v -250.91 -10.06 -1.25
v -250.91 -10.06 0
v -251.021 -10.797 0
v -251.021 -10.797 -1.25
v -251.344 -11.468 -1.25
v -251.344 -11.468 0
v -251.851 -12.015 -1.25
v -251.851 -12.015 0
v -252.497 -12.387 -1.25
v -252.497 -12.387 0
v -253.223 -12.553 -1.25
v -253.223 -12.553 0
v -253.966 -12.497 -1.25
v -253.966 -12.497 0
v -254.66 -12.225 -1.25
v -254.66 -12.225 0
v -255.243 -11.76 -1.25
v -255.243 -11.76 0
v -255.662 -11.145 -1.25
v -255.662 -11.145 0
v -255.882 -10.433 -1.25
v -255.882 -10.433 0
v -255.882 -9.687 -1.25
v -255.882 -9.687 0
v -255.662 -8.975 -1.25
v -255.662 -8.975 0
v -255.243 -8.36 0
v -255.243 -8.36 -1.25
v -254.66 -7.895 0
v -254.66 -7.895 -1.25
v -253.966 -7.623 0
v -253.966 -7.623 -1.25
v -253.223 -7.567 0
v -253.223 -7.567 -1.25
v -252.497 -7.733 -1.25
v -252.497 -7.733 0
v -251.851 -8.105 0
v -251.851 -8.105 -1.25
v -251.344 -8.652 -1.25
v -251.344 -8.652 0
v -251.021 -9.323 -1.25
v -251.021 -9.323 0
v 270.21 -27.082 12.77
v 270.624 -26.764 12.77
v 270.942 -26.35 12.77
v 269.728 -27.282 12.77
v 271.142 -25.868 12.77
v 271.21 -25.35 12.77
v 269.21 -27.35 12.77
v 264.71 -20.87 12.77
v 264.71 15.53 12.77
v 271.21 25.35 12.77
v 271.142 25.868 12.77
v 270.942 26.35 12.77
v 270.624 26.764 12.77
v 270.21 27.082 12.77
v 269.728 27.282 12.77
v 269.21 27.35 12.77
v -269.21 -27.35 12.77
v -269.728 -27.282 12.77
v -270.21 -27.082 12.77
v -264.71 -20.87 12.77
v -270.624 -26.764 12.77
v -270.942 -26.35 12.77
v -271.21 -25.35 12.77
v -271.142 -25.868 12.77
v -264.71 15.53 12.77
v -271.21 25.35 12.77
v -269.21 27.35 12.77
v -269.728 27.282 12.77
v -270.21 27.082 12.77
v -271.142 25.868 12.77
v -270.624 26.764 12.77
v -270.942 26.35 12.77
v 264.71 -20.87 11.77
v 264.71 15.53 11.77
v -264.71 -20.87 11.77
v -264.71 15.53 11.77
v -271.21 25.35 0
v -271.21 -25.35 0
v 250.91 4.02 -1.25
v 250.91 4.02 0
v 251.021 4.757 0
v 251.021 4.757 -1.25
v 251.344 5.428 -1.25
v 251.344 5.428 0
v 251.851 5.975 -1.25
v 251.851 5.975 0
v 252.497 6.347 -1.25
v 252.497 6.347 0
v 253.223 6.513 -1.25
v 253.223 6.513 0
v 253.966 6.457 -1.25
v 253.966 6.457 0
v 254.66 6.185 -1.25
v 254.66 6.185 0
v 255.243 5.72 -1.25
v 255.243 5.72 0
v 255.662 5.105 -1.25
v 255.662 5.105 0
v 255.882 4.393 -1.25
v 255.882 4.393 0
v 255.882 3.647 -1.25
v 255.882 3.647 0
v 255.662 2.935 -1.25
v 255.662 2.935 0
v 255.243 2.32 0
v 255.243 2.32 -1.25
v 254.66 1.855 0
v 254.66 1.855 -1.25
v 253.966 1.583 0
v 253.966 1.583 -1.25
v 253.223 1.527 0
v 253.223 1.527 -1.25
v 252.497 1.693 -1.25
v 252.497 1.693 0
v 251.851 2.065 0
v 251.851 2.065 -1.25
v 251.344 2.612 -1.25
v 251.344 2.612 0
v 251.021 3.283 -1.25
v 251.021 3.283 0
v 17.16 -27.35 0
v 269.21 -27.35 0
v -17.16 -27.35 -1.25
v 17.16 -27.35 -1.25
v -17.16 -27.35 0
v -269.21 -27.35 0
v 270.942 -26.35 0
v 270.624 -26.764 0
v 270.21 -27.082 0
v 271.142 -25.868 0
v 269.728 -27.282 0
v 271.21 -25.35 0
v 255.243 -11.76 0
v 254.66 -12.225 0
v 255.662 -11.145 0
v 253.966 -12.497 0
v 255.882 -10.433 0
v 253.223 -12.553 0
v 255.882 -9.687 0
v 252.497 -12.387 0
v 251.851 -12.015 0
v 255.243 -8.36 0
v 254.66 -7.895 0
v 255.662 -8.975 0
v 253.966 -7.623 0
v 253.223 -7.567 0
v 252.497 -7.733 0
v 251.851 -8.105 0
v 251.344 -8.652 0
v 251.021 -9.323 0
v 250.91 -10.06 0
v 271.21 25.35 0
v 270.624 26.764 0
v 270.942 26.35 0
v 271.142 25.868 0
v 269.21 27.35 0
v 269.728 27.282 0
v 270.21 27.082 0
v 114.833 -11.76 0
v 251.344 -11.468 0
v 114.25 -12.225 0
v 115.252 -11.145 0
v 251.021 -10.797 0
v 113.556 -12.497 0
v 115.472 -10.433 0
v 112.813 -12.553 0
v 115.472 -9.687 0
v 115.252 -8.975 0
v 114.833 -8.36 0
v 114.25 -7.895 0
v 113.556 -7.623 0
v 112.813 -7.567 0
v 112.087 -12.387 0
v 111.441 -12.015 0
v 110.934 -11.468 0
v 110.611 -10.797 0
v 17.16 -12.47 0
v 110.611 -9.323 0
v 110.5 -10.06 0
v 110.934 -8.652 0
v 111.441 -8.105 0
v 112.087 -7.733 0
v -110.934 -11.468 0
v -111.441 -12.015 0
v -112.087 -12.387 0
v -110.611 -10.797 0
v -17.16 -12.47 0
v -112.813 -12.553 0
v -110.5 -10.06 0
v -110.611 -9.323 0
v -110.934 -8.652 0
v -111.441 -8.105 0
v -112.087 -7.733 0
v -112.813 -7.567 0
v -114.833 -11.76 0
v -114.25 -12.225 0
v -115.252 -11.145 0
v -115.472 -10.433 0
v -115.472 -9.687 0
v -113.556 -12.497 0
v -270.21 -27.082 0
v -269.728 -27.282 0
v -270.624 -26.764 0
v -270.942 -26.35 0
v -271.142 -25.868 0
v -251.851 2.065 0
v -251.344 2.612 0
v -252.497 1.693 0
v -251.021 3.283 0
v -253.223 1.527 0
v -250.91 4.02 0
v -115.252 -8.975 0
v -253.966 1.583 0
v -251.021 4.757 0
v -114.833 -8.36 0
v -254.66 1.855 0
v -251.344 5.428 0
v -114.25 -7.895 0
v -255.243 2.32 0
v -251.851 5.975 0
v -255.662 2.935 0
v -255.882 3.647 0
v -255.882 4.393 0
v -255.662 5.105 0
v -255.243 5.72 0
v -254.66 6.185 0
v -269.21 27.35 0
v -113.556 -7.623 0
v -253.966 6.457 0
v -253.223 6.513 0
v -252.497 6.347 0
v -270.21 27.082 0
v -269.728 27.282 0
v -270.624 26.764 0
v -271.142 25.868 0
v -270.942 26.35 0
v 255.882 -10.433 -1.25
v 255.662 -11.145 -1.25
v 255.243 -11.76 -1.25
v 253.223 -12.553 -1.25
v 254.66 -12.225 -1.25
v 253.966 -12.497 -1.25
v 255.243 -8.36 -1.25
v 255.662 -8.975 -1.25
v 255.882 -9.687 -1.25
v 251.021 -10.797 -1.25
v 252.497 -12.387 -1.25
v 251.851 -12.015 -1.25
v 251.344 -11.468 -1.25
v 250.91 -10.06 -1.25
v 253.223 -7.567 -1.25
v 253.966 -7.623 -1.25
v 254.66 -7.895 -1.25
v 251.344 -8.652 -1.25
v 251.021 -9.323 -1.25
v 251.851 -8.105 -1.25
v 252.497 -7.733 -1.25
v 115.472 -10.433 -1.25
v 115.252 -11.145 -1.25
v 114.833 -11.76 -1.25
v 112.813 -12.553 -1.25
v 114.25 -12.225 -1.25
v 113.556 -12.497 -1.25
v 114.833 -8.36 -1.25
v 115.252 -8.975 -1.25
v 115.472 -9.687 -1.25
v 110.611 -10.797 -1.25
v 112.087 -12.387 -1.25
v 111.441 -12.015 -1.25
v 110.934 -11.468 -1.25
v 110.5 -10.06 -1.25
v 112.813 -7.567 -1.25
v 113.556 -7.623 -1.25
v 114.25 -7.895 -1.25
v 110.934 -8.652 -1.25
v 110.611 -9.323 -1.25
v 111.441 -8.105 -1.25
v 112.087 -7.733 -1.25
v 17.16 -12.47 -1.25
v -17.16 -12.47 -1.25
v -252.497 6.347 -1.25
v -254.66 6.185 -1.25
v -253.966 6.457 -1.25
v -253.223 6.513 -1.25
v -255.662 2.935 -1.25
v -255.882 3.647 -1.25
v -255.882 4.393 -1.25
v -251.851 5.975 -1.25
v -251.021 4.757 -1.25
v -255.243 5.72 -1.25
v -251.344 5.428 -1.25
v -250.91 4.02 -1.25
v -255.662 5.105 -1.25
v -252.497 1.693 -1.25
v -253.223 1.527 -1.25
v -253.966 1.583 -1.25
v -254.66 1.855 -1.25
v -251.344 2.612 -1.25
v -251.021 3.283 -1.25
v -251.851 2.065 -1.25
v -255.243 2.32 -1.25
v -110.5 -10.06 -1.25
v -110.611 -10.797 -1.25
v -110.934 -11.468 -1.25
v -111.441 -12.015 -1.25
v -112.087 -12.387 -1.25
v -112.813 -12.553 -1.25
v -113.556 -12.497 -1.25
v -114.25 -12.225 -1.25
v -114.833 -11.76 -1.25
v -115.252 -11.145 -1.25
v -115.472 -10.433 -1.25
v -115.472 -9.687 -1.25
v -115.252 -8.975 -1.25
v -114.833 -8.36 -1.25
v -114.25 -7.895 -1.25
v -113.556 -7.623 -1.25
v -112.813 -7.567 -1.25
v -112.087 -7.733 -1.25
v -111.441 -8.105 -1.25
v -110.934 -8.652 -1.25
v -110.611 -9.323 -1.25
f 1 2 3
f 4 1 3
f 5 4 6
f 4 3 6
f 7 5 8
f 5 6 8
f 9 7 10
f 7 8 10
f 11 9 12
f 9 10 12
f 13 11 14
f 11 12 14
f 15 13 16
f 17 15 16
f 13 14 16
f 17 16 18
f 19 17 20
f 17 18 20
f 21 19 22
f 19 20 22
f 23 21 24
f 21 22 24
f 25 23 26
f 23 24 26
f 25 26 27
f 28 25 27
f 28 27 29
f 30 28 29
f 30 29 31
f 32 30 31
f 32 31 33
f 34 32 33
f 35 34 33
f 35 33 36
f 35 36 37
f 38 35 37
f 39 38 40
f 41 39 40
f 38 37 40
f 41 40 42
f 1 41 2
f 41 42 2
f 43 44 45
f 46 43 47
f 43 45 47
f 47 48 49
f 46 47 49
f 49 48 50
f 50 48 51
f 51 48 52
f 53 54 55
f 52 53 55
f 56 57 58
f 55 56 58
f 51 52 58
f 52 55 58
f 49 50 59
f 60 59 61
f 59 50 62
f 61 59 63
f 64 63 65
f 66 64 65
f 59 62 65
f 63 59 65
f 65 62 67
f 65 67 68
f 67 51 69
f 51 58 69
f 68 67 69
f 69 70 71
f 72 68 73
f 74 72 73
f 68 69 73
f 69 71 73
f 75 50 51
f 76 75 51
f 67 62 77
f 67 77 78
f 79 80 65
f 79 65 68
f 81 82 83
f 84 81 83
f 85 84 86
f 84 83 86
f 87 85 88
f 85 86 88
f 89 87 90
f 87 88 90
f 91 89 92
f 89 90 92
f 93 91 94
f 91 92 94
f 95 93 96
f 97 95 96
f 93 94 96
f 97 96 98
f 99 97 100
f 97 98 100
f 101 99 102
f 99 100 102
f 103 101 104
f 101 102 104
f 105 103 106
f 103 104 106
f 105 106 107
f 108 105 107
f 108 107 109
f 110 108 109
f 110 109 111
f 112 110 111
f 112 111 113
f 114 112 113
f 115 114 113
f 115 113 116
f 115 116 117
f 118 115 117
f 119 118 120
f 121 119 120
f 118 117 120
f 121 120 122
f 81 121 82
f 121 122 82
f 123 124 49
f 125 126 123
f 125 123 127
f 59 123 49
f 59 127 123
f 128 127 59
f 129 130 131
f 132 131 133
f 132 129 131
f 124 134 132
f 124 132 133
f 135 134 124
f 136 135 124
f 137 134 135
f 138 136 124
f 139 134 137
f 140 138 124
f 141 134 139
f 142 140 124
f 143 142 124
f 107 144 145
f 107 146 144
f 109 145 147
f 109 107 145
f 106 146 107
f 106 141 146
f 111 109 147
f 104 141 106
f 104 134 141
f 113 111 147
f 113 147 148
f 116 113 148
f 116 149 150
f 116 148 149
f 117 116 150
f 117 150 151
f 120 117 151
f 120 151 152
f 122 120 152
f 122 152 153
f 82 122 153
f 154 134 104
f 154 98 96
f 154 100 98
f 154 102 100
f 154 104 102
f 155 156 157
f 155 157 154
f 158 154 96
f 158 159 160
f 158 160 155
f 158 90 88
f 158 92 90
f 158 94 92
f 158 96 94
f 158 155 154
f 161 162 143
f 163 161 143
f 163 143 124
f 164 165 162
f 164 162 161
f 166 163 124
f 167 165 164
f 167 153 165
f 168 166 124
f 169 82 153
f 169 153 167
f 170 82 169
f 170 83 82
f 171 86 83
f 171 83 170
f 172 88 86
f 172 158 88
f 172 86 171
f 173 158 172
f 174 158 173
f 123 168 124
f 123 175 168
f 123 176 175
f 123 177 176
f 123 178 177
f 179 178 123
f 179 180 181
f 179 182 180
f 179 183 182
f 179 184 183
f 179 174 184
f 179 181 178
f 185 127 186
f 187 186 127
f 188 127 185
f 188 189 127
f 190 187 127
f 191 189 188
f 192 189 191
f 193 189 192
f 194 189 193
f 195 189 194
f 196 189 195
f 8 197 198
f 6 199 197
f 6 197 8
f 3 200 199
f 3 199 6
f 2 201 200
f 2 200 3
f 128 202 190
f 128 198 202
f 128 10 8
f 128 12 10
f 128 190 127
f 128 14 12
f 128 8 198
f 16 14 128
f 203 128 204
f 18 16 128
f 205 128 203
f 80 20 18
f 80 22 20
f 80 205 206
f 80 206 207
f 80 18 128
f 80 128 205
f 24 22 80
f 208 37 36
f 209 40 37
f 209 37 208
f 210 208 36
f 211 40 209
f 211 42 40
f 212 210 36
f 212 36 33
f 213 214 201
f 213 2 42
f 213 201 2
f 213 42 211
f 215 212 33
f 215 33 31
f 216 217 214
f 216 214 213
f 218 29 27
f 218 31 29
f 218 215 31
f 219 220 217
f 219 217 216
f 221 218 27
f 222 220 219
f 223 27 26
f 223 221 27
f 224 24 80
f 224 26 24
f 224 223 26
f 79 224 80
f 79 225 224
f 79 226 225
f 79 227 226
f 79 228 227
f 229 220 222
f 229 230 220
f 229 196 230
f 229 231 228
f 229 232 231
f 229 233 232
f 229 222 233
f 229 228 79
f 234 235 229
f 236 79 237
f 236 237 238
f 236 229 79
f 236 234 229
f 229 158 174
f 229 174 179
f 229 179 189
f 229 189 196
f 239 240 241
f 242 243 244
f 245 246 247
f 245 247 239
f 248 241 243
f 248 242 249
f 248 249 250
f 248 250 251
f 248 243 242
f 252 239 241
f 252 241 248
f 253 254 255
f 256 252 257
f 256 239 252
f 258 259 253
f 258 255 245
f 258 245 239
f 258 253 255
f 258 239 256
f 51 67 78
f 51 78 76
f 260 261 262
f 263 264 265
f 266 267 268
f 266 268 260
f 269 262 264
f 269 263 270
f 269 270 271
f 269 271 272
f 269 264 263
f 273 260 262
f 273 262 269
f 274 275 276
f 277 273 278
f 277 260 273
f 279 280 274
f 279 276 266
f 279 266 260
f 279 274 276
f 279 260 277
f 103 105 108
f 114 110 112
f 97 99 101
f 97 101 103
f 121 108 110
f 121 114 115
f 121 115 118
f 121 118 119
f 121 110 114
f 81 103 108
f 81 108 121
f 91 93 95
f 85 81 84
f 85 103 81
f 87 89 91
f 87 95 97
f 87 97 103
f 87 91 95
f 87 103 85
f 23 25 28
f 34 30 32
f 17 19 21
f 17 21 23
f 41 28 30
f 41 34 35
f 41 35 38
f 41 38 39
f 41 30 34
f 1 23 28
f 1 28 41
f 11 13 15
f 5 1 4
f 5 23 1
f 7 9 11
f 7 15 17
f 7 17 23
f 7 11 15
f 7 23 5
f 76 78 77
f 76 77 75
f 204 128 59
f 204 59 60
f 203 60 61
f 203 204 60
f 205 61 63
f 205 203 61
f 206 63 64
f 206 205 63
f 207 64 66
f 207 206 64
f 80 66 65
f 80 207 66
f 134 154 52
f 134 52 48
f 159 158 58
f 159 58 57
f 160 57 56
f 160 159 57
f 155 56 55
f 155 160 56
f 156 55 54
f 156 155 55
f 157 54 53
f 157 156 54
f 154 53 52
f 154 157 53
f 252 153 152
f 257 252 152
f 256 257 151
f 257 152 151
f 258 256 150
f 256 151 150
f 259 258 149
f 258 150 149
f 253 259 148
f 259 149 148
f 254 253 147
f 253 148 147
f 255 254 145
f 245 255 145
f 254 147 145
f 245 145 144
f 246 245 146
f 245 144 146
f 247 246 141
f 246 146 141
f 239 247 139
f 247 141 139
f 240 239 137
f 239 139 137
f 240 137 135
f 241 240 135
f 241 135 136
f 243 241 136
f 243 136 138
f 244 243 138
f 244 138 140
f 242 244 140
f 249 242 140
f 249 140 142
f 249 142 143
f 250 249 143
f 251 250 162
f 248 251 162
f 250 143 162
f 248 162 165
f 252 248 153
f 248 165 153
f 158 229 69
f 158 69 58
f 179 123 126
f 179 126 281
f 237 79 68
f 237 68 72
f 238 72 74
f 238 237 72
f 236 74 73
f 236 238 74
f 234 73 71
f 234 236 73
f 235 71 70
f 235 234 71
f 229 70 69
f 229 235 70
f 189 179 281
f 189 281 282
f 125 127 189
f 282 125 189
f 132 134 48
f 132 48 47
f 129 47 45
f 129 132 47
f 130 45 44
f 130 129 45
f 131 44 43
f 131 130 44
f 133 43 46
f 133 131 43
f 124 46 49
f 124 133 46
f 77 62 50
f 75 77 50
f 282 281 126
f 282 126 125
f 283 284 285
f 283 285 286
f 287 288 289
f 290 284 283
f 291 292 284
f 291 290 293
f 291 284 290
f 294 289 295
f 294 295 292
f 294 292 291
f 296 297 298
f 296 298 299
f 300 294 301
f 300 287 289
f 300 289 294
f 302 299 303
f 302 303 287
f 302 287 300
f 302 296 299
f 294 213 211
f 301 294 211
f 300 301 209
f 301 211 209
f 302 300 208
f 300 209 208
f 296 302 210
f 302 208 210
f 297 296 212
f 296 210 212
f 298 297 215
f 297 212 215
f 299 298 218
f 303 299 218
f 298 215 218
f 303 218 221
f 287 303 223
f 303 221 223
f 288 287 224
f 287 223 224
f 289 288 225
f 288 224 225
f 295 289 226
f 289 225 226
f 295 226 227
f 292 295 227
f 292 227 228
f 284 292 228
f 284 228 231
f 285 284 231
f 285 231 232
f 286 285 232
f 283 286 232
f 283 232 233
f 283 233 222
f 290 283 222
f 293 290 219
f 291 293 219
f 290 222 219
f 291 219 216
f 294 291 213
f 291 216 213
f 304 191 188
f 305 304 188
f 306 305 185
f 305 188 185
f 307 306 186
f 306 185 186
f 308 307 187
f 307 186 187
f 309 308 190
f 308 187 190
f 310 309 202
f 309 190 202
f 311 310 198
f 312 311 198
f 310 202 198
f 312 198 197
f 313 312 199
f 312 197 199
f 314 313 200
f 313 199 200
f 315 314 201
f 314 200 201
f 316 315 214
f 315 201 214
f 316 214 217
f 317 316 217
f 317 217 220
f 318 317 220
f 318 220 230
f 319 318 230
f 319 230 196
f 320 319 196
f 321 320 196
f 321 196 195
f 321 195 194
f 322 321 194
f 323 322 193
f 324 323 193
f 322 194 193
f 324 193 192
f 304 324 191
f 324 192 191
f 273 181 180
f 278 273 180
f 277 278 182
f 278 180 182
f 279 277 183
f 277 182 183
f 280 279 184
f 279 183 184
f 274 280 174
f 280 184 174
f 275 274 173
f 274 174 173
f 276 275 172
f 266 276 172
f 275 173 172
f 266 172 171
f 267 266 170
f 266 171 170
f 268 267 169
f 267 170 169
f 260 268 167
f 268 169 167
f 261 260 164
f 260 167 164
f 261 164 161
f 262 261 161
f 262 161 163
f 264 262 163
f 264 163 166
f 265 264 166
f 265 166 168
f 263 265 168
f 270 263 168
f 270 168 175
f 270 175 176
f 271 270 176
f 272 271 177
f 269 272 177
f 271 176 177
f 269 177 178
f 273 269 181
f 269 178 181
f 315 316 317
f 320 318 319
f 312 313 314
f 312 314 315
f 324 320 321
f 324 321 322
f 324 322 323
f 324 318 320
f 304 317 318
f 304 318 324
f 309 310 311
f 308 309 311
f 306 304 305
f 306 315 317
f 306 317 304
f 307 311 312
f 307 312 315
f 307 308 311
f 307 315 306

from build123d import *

# Parameters (mm, degrees)
BOSS_EXTRUDE1_DEPTH = 12.77
SKETCH2_W           = 529.42
SKETCH2_H           = 36.4
CUT_EXTRUDE1_DEPTH  = 1
SKETCH3_R           = 2.5
SKETCH3_W           = 34.32
SKETCH3_H           = 14.88
BOSS_EXTRUDE2_DEPTH = 1.25


with BuildPart() as part:
    # Sketch1 → Boss-Extrude1 (new body)
    with BuildSketch(Plane.XY):
        with BuildLine():
            Line((-269.21, 27.35), (269.21, 27.35))
            ThreePointArc((269.21, 27.35), (270.624213562, 26.764213562), (271.21, 25.35))
            Line((271.21, 25.35), (271.21, -25.35))
            ThreePointArc((271.21, -25.35), (270.624213562, -26.764213562), (269.21, -27.35))
            Line((269.21, -27.35), (-269.21, -27.35))
            ThreePointArc((-269.21, -27.35), (-270.624213562, -26.764213562), (-271.21, -25.35))
            Line((-271.21, -25.35), (-271.21, 25.35))
            ThreePointArc((-271.21, 25.35), (-270.624213562, 26.764213562), (-269.21, 27.35))
        make_face()
    extrude(amount=BOSS_EXTRUDE1_DEPTH)

    # Sketch2 → Cut-Extrude1 (cut)
    with BuildSketch(Plane.XY.offset(12.77)):
        with Locations((0, -2.67)):
            Rectangle(SKETCH2_W, SKETCH2_H)
    extrude(amount=-CUT_EXTRUDE1_DEPTH, mode=Mode.SUBTRACT)

    # Sketch3 → Boss-Extrude2 (add)
    with BuildSketch(Plane(origin=(0, 0, 0), x_dir=(-1, 0, 0), z_dir=(0, 0, -1))):
        with Locations((-253.41, 4.02)):
            Circle(SKETCH3_R)
        with Locations((-253.41, -10.06)):
            Circle(SKETCH3_R)
        with Locations((-113, -10.06)):
            Circle(SKETCH3_R)
        with Locations(Location((113, -10.06, 0), (0, 0, 180))):
            Circle(SKETCH3_R)
        with Locations(Location((253.41, -10.06, 0), (0, 0, 180))):
            Circle(SKETCH3_R)
        with Locations(Location((253.41, 4.02, 0), (0, 0, 180))):
            Circle(SKETCH3_R)
        with Locations((0, -19.91)):
            Rectangle(SKETCH3_W, SKETCH3_H)
    extrude(amount=BOSS_EXTRUDE2_DEPTH)


solid = part.part
